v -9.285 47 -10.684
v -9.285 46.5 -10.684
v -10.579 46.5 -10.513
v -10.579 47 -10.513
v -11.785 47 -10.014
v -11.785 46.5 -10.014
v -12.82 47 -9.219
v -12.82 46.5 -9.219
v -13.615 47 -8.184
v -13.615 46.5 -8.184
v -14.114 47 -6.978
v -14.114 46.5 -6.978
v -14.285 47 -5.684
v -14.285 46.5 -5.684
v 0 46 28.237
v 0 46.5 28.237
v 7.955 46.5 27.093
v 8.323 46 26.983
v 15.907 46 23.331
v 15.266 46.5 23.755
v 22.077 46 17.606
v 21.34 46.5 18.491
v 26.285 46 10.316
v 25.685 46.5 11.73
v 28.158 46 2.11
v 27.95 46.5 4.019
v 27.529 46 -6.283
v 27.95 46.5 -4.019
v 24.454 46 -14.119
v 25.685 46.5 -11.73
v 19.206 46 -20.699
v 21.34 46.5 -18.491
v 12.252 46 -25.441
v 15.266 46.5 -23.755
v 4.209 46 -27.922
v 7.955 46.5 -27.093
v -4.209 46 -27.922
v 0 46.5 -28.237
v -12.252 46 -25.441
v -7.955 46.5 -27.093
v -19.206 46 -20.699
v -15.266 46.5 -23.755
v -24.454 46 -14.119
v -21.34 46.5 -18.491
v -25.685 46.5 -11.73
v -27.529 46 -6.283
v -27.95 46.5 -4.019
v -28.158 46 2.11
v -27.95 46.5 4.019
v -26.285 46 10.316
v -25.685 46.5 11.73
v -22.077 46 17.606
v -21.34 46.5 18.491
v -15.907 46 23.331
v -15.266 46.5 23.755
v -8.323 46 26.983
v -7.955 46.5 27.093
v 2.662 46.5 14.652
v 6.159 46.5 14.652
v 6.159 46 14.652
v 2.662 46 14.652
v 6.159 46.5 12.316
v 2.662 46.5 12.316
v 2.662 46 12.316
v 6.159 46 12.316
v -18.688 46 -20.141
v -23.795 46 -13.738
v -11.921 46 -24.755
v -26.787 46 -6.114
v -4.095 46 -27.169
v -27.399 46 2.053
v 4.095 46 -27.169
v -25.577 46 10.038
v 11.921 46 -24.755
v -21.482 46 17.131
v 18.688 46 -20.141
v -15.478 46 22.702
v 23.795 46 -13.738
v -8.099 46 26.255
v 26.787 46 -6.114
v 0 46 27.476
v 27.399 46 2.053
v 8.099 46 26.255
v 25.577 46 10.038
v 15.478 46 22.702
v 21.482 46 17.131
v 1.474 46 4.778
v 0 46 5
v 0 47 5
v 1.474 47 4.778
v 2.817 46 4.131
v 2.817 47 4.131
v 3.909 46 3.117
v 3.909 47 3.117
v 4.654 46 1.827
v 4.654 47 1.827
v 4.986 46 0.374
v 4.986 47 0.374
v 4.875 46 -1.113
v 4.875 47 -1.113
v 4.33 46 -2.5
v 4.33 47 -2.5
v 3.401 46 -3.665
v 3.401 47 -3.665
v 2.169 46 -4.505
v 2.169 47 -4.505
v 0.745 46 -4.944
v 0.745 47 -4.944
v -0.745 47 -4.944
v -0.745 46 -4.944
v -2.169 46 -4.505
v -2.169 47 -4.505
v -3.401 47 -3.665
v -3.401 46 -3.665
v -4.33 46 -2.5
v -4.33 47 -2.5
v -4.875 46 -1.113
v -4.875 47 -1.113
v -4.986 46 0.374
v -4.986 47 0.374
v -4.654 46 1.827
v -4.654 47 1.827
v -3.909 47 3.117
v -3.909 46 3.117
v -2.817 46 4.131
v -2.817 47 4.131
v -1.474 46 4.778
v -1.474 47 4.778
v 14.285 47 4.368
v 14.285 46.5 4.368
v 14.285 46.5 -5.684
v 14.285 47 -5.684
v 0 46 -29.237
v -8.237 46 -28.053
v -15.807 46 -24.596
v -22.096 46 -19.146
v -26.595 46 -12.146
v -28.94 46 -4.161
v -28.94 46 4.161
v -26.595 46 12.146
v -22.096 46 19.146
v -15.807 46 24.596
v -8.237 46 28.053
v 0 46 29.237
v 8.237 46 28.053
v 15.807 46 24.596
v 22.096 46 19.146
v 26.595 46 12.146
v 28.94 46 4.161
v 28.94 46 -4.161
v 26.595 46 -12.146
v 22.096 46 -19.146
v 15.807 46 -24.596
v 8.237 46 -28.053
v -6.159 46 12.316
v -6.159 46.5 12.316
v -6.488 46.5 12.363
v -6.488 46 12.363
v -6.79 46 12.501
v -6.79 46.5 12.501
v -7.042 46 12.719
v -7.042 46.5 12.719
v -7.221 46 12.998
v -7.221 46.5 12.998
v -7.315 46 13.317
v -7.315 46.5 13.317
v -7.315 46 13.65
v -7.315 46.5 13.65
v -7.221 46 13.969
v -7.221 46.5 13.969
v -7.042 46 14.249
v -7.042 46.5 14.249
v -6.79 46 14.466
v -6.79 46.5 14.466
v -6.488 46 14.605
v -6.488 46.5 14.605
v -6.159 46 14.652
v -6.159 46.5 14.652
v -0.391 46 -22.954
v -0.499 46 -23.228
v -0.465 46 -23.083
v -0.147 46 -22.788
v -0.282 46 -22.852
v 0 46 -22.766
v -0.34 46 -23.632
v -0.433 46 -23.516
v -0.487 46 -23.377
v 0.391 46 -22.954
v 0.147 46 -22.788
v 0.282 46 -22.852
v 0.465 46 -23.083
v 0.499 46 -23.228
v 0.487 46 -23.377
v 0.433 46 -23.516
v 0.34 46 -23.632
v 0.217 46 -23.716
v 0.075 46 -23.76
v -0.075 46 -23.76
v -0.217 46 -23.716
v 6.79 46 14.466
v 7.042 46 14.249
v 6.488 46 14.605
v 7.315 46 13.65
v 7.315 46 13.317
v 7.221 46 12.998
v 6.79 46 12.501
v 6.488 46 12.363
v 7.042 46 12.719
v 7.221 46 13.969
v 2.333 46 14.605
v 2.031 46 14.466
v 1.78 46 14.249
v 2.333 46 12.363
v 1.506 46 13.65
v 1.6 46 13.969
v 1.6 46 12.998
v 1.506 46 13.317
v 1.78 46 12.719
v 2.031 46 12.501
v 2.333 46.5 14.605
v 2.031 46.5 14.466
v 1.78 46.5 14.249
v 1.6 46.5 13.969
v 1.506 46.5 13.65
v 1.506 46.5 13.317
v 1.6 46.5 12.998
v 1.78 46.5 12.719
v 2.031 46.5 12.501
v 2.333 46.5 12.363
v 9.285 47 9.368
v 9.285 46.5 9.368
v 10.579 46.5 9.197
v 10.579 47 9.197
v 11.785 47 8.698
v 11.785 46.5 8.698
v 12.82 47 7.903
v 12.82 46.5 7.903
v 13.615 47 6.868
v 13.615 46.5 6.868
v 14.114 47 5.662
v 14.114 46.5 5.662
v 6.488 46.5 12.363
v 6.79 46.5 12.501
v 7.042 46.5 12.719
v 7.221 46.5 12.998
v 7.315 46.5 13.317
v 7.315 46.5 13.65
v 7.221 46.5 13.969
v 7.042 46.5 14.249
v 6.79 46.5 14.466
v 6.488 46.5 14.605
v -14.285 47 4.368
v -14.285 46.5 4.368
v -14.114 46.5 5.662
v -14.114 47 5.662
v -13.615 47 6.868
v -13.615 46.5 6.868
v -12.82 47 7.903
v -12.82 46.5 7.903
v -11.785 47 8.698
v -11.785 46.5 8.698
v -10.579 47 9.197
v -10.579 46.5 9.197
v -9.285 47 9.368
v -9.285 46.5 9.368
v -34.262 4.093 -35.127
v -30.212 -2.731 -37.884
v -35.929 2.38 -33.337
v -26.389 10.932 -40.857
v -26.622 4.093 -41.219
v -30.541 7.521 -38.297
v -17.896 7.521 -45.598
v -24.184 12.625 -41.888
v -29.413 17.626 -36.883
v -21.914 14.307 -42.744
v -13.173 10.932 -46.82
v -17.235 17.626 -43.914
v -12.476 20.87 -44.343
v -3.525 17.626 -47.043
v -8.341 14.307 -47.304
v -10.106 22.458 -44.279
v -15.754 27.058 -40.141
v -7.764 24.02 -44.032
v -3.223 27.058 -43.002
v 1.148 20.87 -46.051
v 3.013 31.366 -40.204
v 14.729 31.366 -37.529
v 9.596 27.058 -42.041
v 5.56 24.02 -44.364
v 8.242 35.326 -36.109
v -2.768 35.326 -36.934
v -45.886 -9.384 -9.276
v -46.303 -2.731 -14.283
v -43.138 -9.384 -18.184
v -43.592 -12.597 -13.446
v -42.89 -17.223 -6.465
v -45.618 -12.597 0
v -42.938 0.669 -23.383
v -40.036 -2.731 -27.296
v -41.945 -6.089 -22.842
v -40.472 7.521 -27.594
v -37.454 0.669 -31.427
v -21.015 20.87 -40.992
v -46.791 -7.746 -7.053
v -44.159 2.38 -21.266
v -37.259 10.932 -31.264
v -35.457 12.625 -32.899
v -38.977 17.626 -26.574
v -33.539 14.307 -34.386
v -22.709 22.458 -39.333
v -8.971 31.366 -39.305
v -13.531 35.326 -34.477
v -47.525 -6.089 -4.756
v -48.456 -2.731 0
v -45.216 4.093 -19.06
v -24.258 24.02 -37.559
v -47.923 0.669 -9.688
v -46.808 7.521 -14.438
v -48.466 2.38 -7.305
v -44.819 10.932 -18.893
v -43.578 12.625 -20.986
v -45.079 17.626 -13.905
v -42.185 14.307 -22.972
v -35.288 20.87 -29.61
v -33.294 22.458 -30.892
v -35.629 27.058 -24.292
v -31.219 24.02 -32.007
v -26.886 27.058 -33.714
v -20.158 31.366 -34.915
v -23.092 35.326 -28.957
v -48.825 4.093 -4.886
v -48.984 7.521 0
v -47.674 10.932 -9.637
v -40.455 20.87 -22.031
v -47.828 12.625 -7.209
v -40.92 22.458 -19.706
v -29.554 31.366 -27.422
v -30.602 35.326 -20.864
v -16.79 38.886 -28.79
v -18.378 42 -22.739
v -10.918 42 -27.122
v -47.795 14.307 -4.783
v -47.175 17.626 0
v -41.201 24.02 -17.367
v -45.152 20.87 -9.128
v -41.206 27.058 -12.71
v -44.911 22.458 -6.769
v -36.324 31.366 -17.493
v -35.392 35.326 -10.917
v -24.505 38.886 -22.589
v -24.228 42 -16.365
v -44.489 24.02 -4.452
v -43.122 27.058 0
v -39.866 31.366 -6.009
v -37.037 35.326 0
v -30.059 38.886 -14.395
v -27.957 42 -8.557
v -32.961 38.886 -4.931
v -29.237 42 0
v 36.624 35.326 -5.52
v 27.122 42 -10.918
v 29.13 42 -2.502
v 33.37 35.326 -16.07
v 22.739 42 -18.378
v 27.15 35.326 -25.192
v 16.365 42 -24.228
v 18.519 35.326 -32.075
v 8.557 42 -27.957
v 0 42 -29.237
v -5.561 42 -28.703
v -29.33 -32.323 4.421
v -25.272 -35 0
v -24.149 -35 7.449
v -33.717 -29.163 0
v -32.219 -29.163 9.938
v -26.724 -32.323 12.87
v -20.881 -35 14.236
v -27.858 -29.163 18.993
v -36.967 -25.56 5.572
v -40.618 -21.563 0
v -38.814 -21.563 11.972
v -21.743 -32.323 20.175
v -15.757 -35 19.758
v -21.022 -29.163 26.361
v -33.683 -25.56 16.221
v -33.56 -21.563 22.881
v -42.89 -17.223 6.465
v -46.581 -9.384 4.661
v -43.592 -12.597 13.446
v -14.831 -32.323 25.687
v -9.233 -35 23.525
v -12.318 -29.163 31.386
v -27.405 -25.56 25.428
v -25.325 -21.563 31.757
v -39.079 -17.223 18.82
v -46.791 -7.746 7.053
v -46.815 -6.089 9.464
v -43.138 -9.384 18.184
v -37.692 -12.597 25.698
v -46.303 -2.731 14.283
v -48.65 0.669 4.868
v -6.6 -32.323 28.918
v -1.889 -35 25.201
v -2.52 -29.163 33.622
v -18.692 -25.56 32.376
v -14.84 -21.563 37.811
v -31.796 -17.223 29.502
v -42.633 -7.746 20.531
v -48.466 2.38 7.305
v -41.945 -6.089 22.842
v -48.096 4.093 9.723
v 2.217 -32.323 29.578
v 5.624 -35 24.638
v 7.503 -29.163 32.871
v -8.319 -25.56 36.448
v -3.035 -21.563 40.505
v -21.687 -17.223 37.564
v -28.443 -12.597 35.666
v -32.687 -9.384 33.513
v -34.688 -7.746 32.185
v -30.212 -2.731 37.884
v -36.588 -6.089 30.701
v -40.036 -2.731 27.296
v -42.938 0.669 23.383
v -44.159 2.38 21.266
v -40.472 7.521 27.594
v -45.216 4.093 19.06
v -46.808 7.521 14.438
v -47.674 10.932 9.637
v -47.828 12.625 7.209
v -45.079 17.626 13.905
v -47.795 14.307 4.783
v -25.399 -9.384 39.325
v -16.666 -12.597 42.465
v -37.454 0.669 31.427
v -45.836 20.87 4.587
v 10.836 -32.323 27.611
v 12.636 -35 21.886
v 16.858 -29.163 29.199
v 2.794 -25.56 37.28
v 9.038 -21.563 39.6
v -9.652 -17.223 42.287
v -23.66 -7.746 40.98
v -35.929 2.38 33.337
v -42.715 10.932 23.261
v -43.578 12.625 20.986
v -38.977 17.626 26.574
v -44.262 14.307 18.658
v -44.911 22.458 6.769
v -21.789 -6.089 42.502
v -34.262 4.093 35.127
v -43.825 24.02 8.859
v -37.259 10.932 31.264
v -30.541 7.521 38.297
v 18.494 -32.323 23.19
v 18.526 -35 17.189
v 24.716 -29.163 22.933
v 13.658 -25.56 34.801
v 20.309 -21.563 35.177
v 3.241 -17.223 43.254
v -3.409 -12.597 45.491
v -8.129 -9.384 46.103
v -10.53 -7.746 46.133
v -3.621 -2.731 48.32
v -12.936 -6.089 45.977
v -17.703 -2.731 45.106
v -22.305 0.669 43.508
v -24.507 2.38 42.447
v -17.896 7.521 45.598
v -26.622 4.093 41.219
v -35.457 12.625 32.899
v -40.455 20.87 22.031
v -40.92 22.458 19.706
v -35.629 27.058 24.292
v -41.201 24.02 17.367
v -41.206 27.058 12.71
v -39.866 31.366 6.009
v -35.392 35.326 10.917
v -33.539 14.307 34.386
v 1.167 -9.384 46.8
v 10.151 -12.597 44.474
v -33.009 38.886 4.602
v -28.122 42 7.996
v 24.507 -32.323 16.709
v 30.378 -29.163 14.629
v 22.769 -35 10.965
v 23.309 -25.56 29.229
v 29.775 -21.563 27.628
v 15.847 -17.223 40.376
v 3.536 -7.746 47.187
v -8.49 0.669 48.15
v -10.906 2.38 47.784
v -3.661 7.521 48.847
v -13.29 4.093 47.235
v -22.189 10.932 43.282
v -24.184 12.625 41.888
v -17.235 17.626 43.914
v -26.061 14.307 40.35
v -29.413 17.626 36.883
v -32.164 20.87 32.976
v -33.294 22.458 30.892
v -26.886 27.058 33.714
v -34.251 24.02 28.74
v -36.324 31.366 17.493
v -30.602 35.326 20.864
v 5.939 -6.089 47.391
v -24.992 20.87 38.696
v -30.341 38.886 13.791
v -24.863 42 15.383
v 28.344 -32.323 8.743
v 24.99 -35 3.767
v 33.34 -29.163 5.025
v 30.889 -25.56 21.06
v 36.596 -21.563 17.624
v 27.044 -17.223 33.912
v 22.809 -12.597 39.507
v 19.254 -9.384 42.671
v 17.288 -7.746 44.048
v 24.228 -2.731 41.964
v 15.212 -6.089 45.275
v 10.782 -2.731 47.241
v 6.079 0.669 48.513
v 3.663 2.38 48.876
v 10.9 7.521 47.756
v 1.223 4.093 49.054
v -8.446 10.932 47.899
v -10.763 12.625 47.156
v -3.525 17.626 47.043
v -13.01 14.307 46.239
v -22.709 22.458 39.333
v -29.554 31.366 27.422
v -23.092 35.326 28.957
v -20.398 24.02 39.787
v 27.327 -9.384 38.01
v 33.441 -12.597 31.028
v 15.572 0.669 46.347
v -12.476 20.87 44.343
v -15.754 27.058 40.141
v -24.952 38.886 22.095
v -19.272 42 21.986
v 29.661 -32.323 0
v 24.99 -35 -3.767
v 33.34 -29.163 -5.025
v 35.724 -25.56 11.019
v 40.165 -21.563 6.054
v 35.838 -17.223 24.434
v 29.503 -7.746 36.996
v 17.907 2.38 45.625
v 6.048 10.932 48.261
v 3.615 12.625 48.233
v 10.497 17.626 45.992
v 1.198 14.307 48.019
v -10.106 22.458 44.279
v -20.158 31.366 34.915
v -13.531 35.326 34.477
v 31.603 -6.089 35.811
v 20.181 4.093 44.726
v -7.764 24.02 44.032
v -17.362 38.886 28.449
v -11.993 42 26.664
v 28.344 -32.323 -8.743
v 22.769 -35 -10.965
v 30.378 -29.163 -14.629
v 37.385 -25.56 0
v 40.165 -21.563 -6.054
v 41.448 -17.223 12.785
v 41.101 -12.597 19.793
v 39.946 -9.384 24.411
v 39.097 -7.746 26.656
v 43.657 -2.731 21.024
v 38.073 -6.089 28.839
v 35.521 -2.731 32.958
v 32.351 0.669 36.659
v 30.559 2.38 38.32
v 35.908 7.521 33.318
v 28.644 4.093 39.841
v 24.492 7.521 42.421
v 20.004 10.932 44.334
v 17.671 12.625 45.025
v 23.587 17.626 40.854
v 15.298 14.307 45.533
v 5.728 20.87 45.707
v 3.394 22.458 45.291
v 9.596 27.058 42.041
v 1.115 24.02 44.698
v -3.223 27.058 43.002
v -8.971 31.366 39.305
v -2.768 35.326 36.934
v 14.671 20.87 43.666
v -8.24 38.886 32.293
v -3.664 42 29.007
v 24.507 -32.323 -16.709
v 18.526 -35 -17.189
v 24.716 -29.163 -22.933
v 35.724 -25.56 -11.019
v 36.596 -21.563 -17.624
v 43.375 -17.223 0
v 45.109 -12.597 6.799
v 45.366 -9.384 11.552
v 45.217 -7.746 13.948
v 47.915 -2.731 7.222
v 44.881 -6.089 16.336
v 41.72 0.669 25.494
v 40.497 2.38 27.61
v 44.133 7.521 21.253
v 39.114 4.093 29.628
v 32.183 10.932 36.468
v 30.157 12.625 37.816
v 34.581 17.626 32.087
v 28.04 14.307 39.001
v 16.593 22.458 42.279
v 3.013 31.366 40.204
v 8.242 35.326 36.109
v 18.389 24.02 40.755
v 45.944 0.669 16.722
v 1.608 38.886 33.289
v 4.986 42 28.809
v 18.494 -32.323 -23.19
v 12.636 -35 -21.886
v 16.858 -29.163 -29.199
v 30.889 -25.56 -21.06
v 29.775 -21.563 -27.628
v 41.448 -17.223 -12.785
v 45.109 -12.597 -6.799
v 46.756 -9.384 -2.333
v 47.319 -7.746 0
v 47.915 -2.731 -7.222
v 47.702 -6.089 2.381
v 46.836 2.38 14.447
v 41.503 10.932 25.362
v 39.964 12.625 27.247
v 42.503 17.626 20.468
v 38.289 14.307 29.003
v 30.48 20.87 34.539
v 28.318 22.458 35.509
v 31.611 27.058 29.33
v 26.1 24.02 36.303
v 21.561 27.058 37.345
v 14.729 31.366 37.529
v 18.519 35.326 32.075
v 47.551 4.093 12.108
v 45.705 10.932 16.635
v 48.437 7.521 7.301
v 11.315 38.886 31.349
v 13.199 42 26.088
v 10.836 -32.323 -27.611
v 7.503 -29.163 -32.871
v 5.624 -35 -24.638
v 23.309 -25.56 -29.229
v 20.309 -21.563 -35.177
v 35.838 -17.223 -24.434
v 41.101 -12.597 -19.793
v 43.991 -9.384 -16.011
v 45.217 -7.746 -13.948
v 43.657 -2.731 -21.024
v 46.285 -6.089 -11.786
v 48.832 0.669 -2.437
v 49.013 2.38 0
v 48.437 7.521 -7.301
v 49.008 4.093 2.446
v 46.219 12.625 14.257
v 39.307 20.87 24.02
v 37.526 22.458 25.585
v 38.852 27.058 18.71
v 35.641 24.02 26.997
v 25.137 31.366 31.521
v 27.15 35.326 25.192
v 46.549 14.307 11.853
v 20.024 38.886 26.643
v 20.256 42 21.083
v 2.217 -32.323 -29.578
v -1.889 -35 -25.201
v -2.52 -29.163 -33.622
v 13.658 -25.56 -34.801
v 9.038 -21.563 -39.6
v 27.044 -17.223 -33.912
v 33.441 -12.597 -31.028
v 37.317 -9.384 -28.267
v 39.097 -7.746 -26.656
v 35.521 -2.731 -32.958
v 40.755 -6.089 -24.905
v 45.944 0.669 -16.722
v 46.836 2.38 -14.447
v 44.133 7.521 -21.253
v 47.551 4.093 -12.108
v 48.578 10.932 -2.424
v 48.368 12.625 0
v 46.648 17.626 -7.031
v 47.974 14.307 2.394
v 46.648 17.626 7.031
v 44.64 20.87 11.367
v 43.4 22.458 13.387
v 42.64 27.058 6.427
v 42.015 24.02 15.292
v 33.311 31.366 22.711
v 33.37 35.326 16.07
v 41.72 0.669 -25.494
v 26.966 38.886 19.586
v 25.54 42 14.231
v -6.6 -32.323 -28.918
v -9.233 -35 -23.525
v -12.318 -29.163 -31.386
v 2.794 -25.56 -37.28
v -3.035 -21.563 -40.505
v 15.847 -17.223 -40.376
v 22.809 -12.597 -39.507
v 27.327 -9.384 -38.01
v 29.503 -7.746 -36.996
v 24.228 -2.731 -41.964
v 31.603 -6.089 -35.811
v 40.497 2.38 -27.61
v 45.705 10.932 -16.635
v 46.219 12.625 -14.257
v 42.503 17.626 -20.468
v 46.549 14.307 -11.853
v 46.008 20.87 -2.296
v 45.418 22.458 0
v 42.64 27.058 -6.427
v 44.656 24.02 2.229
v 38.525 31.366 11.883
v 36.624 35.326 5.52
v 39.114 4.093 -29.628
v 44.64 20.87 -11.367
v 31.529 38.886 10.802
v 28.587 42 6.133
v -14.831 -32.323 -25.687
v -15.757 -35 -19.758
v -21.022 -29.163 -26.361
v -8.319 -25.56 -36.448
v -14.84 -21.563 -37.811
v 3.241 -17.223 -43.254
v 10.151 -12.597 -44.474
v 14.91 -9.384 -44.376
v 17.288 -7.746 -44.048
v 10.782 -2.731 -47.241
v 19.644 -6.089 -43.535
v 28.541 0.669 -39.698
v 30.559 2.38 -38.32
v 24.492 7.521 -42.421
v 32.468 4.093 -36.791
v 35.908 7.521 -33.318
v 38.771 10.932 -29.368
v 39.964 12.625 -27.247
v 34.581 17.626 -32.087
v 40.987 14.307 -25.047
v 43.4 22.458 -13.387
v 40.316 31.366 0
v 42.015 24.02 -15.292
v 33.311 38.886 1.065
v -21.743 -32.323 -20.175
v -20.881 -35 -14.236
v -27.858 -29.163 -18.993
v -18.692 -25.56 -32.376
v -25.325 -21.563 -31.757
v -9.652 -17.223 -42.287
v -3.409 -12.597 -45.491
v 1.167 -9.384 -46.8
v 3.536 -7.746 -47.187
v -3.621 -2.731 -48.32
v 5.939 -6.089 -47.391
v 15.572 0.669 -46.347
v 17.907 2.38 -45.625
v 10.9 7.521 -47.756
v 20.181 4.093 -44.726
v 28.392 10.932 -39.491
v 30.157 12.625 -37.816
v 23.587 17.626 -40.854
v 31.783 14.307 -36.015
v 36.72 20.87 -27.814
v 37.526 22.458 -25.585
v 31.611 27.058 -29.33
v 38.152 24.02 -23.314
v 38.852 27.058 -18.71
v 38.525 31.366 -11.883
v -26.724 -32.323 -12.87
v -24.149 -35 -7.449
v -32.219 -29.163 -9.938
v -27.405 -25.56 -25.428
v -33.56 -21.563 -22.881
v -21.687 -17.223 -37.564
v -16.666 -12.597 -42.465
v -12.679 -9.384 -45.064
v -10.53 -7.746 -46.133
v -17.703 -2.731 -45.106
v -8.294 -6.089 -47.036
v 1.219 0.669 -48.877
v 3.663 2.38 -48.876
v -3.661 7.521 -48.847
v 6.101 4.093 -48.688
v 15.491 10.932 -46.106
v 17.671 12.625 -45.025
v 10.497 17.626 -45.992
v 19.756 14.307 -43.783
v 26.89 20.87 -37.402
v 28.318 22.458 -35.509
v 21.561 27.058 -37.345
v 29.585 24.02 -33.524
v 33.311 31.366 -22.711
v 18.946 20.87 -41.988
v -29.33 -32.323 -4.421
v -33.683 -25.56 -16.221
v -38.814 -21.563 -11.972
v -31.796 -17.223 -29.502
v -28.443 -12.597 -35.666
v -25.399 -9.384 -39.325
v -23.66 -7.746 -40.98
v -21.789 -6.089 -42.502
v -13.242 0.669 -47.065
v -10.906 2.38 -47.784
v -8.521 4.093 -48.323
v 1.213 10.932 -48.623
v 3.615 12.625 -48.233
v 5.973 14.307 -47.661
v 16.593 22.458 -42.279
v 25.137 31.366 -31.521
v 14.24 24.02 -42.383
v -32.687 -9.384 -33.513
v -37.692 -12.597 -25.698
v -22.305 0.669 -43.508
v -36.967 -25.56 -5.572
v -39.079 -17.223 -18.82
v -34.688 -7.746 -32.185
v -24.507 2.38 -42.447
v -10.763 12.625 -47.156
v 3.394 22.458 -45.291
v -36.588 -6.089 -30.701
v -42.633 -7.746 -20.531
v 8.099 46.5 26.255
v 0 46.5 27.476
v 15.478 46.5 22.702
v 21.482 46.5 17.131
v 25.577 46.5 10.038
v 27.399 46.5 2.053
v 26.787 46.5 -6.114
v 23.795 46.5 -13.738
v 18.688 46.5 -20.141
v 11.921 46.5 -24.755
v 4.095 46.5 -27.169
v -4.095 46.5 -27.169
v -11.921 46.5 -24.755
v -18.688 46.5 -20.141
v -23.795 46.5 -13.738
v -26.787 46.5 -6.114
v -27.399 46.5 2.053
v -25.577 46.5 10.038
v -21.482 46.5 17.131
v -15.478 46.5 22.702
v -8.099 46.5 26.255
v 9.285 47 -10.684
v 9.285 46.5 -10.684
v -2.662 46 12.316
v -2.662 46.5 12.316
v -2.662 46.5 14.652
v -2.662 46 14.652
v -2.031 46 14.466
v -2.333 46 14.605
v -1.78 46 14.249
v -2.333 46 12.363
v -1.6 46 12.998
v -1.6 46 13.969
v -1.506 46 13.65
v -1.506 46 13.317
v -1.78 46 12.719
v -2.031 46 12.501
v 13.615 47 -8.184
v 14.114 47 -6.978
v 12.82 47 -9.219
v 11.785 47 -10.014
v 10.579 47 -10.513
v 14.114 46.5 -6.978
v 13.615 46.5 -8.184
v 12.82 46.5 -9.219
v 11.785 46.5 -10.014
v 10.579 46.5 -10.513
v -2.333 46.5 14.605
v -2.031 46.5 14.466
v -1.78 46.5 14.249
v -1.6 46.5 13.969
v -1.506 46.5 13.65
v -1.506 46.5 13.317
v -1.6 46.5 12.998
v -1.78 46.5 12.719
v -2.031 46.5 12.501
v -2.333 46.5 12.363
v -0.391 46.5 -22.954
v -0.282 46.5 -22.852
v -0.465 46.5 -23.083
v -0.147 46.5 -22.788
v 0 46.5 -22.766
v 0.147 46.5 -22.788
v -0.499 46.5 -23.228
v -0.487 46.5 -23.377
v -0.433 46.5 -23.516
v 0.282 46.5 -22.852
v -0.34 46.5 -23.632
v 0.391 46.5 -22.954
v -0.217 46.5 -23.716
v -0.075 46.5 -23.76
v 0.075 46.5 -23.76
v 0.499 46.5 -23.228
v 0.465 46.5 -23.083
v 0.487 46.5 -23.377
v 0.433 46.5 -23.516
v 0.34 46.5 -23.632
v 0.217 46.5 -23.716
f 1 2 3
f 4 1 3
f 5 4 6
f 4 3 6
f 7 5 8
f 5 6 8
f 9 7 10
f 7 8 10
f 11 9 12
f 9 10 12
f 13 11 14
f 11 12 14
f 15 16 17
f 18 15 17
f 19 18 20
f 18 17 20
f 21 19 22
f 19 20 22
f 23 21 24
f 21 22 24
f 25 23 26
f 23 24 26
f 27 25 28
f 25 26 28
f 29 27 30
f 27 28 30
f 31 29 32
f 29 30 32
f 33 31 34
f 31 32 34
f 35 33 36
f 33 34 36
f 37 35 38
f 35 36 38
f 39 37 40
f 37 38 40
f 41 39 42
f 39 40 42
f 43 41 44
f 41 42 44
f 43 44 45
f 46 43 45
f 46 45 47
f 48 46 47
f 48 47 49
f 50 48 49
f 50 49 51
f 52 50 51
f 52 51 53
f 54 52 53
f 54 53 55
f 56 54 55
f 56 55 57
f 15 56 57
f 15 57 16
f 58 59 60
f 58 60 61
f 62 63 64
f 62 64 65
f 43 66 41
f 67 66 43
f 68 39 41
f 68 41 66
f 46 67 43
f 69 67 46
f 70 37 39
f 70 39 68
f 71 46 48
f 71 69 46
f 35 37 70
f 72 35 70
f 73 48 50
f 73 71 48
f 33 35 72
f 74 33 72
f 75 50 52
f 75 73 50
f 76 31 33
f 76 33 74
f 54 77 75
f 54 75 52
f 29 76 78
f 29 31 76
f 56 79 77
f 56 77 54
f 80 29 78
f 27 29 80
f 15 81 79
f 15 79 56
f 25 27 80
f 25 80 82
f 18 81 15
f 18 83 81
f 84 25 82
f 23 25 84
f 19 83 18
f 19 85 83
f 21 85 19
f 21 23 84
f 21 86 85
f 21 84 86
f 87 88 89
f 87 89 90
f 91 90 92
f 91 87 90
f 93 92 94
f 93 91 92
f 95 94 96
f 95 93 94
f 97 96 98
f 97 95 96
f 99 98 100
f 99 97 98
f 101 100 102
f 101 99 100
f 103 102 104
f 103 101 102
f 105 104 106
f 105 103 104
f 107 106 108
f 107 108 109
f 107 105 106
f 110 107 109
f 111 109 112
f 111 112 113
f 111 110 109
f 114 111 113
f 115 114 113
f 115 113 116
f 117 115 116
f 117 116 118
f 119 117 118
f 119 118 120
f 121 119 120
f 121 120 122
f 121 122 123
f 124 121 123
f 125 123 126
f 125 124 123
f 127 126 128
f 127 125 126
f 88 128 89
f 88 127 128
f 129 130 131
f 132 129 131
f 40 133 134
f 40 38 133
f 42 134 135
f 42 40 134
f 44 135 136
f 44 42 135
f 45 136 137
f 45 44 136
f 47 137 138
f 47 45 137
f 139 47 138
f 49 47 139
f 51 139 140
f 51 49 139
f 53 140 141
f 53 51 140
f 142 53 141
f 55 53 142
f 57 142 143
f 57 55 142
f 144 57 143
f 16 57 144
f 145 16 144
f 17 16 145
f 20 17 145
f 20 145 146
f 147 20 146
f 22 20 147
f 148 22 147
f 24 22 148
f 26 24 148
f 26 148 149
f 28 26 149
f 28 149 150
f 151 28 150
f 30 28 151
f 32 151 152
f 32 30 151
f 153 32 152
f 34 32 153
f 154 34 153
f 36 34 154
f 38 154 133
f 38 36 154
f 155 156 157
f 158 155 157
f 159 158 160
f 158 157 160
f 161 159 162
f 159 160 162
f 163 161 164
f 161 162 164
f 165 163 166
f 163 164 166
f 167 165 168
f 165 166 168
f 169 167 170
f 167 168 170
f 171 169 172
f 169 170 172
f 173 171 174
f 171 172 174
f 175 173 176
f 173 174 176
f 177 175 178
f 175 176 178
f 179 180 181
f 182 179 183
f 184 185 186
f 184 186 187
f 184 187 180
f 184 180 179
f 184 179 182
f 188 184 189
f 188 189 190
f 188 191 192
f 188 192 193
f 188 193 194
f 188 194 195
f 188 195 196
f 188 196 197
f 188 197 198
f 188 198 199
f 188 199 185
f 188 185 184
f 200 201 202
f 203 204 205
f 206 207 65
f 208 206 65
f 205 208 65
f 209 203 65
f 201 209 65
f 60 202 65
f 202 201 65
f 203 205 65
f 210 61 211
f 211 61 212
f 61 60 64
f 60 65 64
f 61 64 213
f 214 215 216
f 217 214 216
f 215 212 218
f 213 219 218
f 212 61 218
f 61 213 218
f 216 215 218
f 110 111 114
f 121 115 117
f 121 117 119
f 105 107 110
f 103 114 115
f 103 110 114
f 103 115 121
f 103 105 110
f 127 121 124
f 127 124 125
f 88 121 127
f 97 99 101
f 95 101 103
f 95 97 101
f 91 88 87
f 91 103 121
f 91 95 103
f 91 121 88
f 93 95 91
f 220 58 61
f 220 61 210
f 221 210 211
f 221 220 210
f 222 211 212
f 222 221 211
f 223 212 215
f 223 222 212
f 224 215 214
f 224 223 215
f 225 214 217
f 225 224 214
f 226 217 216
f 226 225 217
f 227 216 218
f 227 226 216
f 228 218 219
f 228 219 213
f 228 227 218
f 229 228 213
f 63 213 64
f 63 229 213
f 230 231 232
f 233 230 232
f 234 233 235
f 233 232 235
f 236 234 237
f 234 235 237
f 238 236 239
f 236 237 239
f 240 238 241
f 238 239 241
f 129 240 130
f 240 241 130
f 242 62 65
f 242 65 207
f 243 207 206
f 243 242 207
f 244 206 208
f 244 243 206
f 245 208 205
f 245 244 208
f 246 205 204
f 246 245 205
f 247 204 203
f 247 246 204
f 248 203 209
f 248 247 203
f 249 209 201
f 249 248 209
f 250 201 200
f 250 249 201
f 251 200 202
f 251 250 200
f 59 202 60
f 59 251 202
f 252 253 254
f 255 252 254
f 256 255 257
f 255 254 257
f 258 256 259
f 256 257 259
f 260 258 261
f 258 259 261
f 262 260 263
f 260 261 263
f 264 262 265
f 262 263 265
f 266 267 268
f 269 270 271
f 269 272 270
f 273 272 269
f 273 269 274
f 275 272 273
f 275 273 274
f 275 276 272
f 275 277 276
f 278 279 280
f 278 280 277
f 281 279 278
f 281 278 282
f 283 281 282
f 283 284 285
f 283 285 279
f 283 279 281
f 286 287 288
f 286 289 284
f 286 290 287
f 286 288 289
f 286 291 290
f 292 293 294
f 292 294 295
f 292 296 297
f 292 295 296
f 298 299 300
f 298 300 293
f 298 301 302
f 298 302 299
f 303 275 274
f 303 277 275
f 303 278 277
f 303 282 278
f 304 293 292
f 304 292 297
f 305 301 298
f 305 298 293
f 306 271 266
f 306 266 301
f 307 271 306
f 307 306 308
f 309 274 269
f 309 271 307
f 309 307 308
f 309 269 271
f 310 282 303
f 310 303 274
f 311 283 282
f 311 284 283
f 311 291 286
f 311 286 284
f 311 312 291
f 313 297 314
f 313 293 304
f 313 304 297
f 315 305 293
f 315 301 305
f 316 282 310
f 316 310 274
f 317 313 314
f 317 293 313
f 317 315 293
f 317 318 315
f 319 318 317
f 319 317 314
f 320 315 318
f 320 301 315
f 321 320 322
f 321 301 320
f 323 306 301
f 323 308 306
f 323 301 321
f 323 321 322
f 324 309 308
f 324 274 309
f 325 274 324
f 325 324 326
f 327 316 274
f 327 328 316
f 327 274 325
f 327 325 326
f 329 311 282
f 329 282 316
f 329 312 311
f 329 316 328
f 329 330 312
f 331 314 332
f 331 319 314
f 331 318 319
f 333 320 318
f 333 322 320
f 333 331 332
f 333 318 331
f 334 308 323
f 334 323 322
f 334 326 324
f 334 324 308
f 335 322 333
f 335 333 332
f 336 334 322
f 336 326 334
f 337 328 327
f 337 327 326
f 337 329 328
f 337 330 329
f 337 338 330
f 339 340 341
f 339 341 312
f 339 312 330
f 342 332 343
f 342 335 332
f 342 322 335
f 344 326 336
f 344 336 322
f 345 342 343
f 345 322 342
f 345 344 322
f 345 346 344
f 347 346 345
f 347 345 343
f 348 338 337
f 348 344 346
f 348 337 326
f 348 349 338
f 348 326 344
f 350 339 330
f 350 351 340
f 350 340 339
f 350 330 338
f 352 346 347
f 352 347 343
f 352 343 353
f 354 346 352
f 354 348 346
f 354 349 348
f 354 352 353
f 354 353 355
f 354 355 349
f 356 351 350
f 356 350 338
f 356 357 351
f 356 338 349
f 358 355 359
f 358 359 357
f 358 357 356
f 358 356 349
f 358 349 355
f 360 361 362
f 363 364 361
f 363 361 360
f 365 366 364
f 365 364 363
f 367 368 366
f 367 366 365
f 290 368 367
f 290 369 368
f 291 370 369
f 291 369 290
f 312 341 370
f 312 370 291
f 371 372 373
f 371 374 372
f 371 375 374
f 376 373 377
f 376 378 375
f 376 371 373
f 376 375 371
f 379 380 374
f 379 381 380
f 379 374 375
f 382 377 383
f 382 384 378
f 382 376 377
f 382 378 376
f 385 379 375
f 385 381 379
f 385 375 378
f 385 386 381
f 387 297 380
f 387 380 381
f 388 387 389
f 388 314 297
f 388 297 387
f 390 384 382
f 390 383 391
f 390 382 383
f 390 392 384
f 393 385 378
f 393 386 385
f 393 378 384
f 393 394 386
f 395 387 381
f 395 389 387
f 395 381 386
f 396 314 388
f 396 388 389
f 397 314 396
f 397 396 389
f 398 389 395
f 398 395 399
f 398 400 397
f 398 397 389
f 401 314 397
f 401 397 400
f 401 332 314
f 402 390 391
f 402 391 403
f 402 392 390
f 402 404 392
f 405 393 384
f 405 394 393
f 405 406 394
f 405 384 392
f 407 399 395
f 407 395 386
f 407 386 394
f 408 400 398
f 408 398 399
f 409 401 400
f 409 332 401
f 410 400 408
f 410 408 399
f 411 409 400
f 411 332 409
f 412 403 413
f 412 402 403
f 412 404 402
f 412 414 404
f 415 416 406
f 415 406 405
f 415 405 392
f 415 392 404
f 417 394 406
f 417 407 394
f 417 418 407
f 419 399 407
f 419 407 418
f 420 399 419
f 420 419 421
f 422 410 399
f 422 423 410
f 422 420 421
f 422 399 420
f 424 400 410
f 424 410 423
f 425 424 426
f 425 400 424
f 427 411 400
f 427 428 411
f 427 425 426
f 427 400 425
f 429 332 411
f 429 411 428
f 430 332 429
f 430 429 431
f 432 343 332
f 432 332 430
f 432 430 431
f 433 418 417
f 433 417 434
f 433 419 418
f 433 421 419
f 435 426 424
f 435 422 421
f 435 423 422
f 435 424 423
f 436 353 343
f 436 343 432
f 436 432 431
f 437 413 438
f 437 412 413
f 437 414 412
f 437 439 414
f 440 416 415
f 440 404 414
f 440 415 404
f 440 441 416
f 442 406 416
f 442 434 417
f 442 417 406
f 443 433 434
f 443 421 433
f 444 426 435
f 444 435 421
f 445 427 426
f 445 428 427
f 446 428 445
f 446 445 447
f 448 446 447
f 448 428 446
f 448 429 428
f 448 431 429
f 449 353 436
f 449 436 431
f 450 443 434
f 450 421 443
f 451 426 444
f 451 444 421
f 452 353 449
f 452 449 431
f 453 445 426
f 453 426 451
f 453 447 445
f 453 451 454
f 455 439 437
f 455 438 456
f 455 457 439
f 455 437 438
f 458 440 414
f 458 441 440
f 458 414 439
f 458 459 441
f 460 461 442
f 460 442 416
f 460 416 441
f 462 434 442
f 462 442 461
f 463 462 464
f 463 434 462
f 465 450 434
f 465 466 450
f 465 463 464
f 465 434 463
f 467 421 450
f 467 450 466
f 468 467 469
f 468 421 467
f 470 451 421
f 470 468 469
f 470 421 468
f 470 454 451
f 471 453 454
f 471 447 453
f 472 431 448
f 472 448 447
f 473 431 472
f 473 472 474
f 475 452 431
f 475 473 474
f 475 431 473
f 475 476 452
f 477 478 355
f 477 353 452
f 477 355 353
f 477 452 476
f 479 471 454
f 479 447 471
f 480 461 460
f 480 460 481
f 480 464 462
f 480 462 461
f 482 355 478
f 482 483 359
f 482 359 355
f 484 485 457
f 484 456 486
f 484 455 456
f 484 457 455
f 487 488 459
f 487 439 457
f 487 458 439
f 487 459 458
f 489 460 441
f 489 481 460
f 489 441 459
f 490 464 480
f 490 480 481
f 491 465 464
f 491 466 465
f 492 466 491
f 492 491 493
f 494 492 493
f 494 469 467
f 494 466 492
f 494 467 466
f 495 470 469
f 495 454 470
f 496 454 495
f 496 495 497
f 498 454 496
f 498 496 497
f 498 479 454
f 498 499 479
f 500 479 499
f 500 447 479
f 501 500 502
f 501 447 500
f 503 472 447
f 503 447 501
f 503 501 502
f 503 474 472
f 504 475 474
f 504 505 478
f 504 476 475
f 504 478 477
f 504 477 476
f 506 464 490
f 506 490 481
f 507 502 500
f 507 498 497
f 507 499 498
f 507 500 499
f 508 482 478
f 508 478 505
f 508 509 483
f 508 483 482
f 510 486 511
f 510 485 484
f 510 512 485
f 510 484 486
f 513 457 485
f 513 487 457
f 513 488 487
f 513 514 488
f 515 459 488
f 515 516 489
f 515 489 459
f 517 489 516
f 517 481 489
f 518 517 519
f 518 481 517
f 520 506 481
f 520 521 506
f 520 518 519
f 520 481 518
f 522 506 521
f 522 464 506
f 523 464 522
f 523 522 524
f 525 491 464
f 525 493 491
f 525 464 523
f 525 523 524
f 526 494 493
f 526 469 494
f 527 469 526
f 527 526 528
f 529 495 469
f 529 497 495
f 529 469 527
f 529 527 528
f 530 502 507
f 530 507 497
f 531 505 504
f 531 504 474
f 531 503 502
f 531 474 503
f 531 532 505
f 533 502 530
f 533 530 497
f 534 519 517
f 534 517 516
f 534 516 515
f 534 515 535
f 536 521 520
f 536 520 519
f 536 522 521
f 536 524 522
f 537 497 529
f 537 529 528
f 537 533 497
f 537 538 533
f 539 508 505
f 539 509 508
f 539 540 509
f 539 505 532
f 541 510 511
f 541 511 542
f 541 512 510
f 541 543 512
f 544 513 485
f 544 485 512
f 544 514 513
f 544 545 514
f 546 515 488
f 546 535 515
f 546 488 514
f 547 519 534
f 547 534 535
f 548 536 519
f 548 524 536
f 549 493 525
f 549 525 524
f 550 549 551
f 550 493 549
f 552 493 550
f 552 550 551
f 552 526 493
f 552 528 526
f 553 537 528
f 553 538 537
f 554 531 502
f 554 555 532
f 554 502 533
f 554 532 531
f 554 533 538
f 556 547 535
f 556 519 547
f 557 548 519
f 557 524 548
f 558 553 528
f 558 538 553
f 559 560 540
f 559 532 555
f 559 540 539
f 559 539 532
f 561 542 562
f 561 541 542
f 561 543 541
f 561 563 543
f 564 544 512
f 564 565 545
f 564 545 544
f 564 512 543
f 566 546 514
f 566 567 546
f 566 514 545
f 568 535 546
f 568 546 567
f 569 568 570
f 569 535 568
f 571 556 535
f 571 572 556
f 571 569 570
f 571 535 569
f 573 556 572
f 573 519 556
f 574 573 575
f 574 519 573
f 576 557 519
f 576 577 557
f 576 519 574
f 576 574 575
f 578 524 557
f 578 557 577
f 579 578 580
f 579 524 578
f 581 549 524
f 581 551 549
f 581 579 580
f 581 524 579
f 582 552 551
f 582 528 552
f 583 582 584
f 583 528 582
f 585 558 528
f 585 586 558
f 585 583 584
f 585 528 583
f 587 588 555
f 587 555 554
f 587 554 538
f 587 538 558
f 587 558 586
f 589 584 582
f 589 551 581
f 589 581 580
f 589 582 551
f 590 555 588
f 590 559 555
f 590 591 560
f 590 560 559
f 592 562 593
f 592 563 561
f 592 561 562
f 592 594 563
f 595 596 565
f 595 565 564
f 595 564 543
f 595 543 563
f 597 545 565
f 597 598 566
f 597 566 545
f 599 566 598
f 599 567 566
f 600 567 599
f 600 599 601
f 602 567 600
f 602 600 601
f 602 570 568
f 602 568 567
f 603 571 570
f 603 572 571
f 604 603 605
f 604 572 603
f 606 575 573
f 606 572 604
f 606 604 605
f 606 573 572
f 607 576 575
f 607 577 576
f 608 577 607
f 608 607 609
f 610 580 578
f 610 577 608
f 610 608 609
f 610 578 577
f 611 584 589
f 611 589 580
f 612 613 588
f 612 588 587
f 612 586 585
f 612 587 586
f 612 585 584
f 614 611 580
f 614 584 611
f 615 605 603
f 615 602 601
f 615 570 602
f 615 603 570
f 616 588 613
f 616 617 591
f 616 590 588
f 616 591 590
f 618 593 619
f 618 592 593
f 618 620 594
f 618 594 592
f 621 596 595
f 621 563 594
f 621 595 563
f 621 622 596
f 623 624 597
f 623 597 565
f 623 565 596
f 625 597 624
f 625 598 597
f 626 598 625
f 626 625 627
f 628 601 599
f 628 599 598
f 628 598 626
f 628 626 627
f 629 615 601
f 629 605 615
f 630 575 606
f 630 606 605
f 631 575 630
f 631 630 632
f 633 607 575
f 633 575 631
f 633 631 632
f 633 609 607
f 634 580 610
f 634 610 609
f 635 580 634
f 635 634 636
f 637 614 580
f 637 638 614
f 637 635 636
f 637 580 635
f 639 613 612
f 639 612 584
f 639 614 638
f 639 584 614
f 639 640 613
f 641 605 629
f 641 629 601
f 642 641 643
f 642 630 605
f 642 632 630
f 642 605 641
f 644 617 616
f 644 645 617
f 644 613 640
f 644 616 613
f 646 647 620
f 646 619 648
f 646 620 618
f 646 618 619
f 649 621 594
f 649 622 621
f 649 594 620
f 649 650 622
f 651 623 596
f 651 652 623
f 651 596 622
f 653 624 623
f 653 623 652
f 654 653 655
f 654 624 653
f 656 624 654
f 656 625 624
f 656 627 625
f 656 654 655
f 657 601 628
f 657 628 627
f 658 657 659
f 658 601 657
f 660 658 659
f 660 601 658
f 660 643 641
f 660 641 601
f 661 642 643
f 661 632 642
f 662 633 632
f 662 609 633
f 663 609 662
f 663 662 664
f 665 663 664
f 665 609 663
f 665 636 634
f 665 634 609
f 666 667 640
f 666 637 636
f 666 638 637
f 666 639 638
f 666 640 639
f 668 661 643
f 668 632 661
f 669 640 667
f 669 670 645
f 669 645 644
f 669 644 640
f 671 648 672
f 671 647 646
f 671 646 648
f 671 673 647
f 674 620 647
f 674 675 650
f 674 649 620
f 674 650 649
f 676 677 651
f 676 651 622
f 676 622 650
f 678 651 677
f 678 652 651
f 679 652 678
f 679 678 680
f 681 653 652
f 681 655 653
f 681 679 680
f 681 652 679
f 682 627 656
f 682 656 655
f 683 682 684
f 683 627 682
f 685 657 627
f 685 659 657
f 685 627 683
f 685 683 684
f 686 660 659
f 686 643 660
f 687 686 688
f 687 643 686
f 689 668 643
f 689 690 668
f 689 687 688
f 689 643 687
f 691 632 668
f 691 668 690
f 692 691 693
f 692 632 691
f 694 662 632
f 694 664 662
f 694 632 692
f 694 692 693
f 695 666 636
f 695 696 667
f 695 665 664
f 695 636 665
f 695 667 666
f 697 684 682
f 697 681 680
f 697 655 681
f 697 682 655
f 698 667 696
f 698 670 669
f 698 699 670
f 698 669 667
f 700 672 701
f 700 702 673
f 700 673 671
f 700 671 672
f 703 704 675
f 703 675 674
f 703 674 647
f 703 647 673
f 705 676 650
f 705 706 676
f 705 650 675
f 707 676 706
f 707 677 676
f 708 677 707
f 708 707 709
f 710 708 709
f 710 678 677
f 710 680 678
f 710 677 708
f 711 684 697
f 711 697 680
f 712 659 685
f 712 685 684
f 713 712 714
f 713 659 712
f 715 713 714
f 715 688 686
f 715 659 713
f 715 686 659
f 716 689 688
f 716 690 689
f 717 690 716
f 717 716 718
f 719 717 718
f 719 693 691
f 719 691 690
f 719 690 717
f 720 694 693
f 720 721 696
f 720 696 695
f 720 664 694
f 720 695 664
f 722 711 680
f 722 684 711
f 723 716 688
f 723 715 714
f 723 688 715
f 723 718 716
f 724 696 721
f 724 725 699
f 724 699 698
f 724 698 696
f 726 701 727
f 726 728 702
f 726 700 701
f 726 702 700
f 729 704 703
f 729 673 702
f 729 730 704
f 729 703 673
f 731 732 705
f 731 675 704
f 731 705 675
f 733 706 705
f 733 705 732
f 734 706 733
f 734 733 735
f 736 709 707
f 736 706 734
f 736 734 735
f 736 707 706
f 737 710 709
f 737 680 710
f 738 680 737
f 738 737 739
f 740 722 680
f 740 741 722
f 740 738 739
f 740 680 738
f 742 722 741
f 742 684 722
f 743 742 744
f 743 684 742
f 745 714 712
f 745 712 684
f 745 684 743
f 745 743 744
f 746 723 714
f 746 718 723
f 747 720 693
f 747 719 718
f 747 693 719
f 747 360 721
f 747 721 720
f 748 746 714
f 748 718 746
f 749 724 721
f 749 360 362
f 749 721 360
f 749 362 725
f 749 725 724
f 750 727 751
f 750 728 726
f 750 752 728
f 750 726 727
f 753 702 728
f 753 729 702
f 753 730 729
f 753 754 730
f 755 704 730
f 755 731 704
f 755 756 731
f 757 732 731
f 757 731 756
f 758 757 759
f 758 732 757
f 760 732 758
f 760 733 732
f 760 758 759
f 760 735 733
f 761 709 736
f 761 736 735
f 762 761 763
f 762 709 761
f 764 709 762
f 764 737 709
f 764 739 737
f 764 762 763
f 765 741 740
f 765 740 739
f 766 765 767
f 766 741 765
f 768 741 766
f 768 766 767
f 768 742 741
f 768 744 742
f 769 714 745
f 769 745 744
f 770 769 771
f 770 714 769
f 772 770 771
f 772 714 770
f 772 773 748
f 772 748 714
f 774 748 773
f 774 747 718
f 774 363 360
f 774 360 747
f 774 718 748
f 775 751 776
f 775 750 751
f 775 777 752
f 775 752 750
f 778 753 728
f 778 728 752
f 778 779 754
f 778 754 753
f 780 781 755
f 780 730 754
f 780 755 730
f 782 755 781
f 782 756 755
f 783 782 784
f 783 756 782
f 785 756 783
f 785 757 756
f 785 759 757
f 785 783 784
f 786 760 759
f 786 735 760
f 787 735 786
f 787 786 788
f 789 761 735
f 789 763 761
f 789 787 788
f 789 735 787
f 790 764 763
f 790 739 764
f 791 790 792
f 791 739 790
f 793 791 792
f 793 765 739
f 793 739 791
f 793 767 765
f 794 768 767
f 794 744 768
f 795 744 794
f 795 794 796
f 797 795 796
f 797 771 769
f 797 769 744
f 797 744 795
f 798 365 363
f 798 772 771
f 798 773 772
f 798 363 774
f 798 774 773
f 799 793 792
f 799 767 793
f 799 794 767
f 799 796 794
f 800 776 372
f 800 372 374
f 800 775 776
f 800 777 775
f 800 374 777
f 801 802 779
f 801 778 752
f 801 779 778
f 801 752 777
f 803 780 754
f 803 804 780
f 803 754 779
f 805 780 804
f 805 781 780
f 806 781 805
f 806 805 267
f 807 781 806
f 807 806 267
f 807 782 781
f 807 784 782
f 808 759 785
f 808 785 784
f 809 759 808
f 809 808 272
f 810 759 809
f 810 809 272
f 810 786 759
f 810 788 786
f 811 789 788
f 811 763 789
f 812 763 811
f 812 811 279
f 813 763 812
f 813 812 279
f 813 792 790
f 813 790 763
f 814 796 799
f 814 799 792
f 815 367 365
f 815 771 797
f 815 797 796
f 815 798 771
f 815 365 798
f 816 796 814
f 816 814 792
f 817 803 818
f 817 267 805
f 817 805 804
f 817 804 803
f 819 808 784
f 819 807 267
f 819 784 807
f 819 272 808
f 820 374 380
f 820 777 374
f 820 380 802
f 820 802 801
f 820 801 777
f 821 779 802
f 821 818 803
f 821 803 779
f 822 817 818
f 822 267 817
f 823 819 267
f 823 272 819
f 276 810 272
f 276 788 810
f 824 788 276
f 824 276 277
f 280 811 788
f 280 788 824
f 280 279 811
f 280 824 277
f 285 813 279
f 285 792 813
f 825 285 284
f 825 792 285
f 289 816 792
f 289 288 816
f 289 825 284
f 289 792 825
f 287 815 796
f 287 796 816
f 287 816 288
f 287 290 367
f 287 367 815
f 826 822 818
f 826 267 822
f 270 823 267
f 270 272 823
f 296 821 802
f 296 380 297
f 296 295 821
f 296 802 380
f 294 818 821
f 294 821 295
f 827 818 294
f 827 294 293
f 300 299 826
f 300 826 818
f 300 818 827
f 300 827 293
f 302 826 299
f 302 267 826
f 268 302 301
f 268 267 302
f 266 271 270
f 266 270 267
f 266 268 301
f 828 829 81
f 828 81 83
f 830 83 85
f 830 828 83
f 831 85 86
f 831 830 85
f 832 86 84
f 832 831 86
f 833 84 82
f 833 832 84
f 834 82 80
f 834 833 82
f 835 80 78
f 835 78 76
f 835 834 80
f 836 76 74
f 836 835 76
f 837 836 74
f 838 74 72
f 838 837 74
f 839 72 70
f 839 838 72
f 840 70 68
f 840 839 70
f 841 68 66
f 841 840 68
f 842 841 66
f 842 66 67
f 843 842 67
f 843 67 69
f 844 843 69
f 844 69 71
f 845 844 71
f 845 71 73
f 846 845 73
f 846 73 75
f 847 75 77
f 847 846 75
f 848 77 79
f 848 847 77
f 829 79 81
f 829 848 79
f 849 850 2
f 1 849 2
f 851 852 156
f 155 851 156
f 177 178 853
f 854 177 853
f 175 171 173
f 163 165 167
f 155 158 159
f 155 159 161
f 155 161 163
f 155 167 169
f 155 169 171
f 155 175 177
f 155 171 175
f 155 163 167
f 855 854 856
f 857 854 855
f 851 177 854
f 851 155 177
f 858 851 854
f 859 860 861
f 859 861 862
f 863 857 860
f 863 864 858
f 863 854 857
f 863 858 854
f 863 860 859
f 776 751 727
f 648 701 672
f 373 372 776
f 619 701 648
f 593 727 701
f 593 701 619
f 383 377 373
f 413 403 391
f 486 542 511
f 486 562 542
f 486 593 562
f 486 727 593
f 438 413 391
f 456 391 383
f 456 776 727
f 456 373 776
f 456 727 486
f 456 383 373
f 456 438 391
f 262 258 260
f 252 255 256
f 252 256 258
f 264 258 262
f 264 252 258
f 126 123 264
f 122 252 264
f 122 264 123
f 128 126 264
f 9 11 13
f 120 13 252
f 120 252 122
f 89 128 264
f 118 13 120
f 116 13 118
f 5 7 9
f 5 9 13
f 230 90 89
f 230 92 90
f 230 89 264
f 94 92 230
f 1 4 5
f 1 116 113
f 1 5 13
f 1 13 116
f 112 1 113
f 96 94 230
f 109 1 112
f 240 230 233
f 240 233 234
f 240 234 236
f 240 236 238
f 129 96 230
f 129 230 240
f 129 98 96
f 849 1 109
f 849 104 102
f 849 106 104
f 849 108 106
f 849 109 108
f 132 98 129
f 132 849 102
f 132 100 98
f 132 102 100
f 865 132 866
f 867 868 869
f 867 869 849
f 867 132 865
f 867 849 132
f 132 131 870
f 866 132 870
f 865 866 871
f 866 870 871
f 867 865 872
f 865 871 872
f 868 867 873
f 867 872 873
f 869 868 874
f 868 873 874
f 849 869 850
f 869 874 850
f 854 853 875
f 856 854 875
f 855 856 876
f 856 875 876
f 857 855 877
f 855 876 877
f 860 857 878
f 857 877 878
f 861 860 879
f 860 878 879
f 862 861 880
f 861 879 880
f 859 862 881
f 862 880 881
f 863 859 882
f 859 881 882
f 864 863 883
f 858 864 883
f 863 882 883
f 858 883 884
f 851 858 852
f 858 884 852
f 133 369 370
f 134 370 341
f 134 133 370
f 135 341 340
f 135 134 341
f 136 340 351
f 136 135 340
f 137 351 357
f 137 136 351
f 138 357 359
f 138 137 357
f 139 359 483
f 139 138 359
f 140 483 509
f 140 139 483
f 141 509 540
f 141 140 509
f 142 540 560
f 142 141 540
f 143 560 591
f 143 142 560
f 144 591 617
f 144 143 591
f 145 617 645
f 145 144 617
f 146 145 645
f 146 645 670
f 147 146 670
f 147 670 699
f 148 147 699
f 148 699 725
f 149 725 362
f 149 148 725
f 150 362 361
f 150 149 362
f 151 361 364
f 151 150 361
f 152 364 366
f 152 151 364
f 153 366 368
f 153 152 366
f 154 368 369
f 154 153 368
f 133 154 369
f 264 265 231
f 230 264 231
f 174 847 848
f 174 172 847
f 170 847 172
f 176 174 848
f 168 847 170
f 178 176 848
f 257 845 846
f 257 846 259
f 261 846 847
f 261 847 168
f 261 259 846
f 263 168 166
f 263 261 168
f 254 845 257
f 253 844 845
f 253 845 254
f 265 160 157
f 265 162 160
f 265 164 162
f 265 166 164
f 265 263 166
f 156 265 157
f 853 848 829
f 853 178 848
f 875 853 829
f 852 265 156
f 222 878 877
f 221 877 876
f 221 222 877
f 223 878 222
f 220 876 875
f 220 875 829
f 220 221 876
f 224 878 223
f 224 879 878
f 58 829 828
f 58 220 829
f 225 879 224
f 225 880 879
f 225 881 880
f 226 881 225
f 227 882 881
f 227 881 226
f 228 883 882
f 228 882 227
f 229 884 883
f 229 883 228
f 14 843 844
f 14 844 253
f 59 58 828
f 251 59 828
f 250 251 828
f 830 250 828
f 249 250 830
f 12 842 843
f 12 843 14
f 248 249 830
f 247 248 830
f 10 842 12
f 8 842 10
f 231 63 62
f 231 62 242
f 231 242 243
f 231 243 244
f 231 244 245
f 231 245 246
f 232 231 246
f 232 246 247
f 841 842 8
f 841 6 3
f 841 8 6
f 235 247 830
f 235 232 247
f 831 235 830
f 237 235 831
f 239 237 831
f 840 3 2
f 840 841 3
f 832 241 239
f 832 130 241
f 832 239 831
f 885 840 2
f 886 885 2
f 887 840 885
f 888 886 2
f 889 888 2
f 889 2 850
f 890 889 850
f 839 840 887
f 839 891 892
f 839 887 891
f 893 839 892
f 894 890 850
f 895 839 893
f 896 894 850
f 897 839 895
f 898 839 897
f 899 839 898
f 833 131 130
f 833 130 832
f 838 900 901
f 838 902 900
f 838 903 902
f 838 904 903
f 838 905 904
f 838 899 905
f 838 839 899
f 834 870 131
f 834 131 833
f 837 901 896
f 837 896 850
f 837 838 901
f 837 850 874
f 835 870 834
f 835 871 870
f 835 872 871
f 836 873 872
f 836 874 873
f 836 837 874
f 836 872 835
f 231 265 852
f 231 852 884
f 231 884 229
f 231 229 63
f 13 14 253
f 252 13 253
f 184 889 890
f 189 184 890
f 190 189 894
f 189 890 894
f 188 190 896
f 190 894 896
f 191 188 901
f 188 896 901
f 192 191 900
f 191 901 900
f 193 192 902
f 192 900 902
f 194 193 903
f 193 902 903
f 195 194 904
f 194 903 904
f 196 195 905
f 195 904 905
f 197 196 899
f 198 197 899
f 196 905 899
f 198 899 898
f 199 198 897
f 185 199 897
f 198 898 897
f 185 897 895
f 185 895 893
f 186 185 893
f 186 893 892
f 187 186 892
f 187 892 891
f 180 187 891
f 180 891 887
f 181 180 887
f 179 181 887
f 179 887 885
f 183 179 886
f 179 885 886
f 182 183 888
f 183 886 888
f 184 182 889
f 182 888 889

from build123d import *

# Parameters (mm, degrees)
CUT_EXTRUDE1_DEPTH      = 86.356590332
CUT_EXTRUDE1_DEPTH_BACK = 86.356590332
SKETCH9_R               = 28.237117721
BOSS_EXTRUDE3_DEPTH     = 4.5
SKETCH10_R              = 28.237117721
SKETCH10_R_2            = 27.47603731
CUT_EXTRUDE2_DEPTH      = 0.5
CUT_EXTRUDE4_DEPTH      = 0.5
CUT_EXTRUDE5_DEPTH      = 0.5
BOSS_EXTRUDE5_DEPTH     = 0.5
CUT_EXTRUDE7_DEPTH      = 0.5
CUT_EXTRUDE7_DEPTH_BACK = 0.5
SKETCH11_11_R           = 5
SKETCH11_12_R           = 0.5
CUT_EXTRUDE8_DEPTH      = 0.5


with BuildPart() as part:
    # Sketch1 → Revolve1 (revolve)
    with BuildSketch(Plane.XY):
        with BuildLine():
            Line((0, 49.509049853), (0, -35))
            Line((0, -35), (-25.272030651, -35))
            ThreePointArc((-25.272030651, -35), (-47.186298393, 17.586623254), (0, 49.509049853))
        make_face()
    revolve(axis=Axis((0, 0, 0), (0, 1, 0)))

    # Sketch2 → Cut-Extrude1 (cut, two sides: drawn at the far end of the back side and taken through both)
    with BuildSketch(Plane.XY.offset(-CUT_EXTRUDE1_DEPTH_BACK)):
        Polygon((57.527772065, 42), (57.527772065, 50), (-10, 50), (-49.614603295, 50), (-49.614603295, 42), align=None)
    extrude(amount=CUT_EXTRUDE1_DEPTH + CUT_EXTRUDE1_DEPTH_BACK, mode=Mode.SUBTRACT)

    # Sketch8 → Revolve2 (revolve)
    with BuildSketch(Plane.XY):
        Polygon((-29.237117721, 42), (-29.237117721, 46), (-28.237117721, 46.5), (-28.237117721, 42), align=None)
    revolve(axis=Axis((0, 0, 0), (0, 1, 0)))

    # Sketch9 → Boss-Extrude3 (add)
    with BuildSketch(Plane(origin=(0, 42, 0), x_dir=(1, 0, 0), z_dir=(0, 1, 0))):
        Circle(SKETCH9_R)
    extrude(amount=BOSS_EXTRUDE3_DEPTH)

    # Sketch10 → Cut-Extrude2 (cut)
    with BuildSketch(Plane(origin=(0, 46.5, 0), x_dir=(1, 0, 0), z_dir=(0, 1, 0))):
        Circle(SKETCH10_R)
        Circle(SKETCH10_R_2, mode=Mode.SUBTRACT)
    extrude(amount=-CUT_EXTRUDE2_DEPTH, mode=Mode.SUBTRACT)

    # Sketch11 → Cut-Extrude4 (cut)
    with BuildSketch(Plane(origin=(0, 46.5, 0), x_dir=(1, 0, 0), z_dir=(0, 1, 0))):
        with BuildLine():
            Line((-2.662439007, -12.315535384), (-6.158792876, -12.315535384))
            ThreePointArc((-6.158792876, -12.315535384), (-7.326955988, -13.483698497), (-6.158792876, -14.651861609))
            Line((-6.158792876, -14.651861609), (-2.662439007, -14.651861609))
            ThreePointArc((-2.662439007, -14.651861609), (-1.494275894, -13.483698497), (-2.662439007, -12.315535384))
        make_face()
    extrude(amount=-CUT_EXTRUDE4_DEPTH, mode=Mode.SUBTRACT)

    # Sketch11<7> → Cut-Extrude5 (cut)
    with BuildSketch(Plane(origin=(0, 46.5, 0), x_dir=(1, 0, 0), z_dir=(0, 1, 0))):
        with BuildLine():
            Line((2.662439007, -12.315535384), (6.158792876, -12.315535384))
            ThreePointArc((6.158792876, -12.315535384), (7.326955988, -13.483698497), (6.158792876, -14.651861609))
            Line((6.158792876, -14.651861609), (2.662439007, -14.651861609))
            ThreePointArc((2.662439007, -14.651861609), (1.494275894, -13.483698497), (2.662439007, -12.315535384))
        make_face()
    extrude(amount=-CUT_EXTRUDE5_DEPTH, mode=Mode.SUBTRACT)

    # Sketch11<10> → Boss-Extrude5 (add)
    with BuildSketch(Plane(origin=(0, 46.5, 0), x_dir=(1, 0, 0), z_dir=(0, 1, 0))):
        with BuildLine():
            Line((9.284761758, 10.683638038), (-9.284761758, 10.683638038))
            ThreePointArc((-9.284761758, 10.683638038), (-12.820295664, 9.219171944), (-14.284761758, 5.683638038))
            Line((-14.284761758, 5.683638038), (-14.284761758, -4.367615893))
            ThreePointArc((-14.284761758, -4.367615893), (-12.820295664, -7.903149799), (-9.284761758, -9.367615893))
            Line((-9.284761758, -9.367615893), (9.284761758, -9.367615893))
            ThreePointArc((9.284761758, -9.367615893), (12.820295664, -7.903149799), (14.284761758, -4.367615893))
            Line((14.284761758, -4.367615893), (14.284761758, 5.683638038))
            ThreePointArc((14.284761758, 5.683638038), (12.820295664, 9.219171944), (9.284761758, 10.683638038))
        make_face()
    extrude(amount=BOSS_EXTRUDE5_DEPTH)

    # Sketch11<11> → Cut-Extrude7 (cut, two sides: drawn at the far end of the back side and taken through both)
    with BuildSketch(Plane(origin=(0, 46.5, 0), x_dir=(1, 0, 0), z_dir=(0, 1, 0)).offset(-CUT_EXTRUDE7_DEPTH_BACK)):
        Circle(SKETCH11_11_R)
    extrude(amount=CUT_EXTRUDE7_DEPTH + CUT_EXTRUDE7_DEPTH_BACK, mode=Mode.SUBTRACT)

    # Sketch11<12> → Cut-Extrude8 (cut)
    with BuildSketch(Plane(origin=(0, 46.5, 0), x_dir=(1, 0, 0), z_dir=(0, 1, 0))):
        with Locations((0, 23.265511796)):
            Circle(SKETCH11_12_R)
    extrude(amount=-CUT_EXTRUDE8_DEPTH, mode=Mode.SUBTRACT)


solid = part.part
